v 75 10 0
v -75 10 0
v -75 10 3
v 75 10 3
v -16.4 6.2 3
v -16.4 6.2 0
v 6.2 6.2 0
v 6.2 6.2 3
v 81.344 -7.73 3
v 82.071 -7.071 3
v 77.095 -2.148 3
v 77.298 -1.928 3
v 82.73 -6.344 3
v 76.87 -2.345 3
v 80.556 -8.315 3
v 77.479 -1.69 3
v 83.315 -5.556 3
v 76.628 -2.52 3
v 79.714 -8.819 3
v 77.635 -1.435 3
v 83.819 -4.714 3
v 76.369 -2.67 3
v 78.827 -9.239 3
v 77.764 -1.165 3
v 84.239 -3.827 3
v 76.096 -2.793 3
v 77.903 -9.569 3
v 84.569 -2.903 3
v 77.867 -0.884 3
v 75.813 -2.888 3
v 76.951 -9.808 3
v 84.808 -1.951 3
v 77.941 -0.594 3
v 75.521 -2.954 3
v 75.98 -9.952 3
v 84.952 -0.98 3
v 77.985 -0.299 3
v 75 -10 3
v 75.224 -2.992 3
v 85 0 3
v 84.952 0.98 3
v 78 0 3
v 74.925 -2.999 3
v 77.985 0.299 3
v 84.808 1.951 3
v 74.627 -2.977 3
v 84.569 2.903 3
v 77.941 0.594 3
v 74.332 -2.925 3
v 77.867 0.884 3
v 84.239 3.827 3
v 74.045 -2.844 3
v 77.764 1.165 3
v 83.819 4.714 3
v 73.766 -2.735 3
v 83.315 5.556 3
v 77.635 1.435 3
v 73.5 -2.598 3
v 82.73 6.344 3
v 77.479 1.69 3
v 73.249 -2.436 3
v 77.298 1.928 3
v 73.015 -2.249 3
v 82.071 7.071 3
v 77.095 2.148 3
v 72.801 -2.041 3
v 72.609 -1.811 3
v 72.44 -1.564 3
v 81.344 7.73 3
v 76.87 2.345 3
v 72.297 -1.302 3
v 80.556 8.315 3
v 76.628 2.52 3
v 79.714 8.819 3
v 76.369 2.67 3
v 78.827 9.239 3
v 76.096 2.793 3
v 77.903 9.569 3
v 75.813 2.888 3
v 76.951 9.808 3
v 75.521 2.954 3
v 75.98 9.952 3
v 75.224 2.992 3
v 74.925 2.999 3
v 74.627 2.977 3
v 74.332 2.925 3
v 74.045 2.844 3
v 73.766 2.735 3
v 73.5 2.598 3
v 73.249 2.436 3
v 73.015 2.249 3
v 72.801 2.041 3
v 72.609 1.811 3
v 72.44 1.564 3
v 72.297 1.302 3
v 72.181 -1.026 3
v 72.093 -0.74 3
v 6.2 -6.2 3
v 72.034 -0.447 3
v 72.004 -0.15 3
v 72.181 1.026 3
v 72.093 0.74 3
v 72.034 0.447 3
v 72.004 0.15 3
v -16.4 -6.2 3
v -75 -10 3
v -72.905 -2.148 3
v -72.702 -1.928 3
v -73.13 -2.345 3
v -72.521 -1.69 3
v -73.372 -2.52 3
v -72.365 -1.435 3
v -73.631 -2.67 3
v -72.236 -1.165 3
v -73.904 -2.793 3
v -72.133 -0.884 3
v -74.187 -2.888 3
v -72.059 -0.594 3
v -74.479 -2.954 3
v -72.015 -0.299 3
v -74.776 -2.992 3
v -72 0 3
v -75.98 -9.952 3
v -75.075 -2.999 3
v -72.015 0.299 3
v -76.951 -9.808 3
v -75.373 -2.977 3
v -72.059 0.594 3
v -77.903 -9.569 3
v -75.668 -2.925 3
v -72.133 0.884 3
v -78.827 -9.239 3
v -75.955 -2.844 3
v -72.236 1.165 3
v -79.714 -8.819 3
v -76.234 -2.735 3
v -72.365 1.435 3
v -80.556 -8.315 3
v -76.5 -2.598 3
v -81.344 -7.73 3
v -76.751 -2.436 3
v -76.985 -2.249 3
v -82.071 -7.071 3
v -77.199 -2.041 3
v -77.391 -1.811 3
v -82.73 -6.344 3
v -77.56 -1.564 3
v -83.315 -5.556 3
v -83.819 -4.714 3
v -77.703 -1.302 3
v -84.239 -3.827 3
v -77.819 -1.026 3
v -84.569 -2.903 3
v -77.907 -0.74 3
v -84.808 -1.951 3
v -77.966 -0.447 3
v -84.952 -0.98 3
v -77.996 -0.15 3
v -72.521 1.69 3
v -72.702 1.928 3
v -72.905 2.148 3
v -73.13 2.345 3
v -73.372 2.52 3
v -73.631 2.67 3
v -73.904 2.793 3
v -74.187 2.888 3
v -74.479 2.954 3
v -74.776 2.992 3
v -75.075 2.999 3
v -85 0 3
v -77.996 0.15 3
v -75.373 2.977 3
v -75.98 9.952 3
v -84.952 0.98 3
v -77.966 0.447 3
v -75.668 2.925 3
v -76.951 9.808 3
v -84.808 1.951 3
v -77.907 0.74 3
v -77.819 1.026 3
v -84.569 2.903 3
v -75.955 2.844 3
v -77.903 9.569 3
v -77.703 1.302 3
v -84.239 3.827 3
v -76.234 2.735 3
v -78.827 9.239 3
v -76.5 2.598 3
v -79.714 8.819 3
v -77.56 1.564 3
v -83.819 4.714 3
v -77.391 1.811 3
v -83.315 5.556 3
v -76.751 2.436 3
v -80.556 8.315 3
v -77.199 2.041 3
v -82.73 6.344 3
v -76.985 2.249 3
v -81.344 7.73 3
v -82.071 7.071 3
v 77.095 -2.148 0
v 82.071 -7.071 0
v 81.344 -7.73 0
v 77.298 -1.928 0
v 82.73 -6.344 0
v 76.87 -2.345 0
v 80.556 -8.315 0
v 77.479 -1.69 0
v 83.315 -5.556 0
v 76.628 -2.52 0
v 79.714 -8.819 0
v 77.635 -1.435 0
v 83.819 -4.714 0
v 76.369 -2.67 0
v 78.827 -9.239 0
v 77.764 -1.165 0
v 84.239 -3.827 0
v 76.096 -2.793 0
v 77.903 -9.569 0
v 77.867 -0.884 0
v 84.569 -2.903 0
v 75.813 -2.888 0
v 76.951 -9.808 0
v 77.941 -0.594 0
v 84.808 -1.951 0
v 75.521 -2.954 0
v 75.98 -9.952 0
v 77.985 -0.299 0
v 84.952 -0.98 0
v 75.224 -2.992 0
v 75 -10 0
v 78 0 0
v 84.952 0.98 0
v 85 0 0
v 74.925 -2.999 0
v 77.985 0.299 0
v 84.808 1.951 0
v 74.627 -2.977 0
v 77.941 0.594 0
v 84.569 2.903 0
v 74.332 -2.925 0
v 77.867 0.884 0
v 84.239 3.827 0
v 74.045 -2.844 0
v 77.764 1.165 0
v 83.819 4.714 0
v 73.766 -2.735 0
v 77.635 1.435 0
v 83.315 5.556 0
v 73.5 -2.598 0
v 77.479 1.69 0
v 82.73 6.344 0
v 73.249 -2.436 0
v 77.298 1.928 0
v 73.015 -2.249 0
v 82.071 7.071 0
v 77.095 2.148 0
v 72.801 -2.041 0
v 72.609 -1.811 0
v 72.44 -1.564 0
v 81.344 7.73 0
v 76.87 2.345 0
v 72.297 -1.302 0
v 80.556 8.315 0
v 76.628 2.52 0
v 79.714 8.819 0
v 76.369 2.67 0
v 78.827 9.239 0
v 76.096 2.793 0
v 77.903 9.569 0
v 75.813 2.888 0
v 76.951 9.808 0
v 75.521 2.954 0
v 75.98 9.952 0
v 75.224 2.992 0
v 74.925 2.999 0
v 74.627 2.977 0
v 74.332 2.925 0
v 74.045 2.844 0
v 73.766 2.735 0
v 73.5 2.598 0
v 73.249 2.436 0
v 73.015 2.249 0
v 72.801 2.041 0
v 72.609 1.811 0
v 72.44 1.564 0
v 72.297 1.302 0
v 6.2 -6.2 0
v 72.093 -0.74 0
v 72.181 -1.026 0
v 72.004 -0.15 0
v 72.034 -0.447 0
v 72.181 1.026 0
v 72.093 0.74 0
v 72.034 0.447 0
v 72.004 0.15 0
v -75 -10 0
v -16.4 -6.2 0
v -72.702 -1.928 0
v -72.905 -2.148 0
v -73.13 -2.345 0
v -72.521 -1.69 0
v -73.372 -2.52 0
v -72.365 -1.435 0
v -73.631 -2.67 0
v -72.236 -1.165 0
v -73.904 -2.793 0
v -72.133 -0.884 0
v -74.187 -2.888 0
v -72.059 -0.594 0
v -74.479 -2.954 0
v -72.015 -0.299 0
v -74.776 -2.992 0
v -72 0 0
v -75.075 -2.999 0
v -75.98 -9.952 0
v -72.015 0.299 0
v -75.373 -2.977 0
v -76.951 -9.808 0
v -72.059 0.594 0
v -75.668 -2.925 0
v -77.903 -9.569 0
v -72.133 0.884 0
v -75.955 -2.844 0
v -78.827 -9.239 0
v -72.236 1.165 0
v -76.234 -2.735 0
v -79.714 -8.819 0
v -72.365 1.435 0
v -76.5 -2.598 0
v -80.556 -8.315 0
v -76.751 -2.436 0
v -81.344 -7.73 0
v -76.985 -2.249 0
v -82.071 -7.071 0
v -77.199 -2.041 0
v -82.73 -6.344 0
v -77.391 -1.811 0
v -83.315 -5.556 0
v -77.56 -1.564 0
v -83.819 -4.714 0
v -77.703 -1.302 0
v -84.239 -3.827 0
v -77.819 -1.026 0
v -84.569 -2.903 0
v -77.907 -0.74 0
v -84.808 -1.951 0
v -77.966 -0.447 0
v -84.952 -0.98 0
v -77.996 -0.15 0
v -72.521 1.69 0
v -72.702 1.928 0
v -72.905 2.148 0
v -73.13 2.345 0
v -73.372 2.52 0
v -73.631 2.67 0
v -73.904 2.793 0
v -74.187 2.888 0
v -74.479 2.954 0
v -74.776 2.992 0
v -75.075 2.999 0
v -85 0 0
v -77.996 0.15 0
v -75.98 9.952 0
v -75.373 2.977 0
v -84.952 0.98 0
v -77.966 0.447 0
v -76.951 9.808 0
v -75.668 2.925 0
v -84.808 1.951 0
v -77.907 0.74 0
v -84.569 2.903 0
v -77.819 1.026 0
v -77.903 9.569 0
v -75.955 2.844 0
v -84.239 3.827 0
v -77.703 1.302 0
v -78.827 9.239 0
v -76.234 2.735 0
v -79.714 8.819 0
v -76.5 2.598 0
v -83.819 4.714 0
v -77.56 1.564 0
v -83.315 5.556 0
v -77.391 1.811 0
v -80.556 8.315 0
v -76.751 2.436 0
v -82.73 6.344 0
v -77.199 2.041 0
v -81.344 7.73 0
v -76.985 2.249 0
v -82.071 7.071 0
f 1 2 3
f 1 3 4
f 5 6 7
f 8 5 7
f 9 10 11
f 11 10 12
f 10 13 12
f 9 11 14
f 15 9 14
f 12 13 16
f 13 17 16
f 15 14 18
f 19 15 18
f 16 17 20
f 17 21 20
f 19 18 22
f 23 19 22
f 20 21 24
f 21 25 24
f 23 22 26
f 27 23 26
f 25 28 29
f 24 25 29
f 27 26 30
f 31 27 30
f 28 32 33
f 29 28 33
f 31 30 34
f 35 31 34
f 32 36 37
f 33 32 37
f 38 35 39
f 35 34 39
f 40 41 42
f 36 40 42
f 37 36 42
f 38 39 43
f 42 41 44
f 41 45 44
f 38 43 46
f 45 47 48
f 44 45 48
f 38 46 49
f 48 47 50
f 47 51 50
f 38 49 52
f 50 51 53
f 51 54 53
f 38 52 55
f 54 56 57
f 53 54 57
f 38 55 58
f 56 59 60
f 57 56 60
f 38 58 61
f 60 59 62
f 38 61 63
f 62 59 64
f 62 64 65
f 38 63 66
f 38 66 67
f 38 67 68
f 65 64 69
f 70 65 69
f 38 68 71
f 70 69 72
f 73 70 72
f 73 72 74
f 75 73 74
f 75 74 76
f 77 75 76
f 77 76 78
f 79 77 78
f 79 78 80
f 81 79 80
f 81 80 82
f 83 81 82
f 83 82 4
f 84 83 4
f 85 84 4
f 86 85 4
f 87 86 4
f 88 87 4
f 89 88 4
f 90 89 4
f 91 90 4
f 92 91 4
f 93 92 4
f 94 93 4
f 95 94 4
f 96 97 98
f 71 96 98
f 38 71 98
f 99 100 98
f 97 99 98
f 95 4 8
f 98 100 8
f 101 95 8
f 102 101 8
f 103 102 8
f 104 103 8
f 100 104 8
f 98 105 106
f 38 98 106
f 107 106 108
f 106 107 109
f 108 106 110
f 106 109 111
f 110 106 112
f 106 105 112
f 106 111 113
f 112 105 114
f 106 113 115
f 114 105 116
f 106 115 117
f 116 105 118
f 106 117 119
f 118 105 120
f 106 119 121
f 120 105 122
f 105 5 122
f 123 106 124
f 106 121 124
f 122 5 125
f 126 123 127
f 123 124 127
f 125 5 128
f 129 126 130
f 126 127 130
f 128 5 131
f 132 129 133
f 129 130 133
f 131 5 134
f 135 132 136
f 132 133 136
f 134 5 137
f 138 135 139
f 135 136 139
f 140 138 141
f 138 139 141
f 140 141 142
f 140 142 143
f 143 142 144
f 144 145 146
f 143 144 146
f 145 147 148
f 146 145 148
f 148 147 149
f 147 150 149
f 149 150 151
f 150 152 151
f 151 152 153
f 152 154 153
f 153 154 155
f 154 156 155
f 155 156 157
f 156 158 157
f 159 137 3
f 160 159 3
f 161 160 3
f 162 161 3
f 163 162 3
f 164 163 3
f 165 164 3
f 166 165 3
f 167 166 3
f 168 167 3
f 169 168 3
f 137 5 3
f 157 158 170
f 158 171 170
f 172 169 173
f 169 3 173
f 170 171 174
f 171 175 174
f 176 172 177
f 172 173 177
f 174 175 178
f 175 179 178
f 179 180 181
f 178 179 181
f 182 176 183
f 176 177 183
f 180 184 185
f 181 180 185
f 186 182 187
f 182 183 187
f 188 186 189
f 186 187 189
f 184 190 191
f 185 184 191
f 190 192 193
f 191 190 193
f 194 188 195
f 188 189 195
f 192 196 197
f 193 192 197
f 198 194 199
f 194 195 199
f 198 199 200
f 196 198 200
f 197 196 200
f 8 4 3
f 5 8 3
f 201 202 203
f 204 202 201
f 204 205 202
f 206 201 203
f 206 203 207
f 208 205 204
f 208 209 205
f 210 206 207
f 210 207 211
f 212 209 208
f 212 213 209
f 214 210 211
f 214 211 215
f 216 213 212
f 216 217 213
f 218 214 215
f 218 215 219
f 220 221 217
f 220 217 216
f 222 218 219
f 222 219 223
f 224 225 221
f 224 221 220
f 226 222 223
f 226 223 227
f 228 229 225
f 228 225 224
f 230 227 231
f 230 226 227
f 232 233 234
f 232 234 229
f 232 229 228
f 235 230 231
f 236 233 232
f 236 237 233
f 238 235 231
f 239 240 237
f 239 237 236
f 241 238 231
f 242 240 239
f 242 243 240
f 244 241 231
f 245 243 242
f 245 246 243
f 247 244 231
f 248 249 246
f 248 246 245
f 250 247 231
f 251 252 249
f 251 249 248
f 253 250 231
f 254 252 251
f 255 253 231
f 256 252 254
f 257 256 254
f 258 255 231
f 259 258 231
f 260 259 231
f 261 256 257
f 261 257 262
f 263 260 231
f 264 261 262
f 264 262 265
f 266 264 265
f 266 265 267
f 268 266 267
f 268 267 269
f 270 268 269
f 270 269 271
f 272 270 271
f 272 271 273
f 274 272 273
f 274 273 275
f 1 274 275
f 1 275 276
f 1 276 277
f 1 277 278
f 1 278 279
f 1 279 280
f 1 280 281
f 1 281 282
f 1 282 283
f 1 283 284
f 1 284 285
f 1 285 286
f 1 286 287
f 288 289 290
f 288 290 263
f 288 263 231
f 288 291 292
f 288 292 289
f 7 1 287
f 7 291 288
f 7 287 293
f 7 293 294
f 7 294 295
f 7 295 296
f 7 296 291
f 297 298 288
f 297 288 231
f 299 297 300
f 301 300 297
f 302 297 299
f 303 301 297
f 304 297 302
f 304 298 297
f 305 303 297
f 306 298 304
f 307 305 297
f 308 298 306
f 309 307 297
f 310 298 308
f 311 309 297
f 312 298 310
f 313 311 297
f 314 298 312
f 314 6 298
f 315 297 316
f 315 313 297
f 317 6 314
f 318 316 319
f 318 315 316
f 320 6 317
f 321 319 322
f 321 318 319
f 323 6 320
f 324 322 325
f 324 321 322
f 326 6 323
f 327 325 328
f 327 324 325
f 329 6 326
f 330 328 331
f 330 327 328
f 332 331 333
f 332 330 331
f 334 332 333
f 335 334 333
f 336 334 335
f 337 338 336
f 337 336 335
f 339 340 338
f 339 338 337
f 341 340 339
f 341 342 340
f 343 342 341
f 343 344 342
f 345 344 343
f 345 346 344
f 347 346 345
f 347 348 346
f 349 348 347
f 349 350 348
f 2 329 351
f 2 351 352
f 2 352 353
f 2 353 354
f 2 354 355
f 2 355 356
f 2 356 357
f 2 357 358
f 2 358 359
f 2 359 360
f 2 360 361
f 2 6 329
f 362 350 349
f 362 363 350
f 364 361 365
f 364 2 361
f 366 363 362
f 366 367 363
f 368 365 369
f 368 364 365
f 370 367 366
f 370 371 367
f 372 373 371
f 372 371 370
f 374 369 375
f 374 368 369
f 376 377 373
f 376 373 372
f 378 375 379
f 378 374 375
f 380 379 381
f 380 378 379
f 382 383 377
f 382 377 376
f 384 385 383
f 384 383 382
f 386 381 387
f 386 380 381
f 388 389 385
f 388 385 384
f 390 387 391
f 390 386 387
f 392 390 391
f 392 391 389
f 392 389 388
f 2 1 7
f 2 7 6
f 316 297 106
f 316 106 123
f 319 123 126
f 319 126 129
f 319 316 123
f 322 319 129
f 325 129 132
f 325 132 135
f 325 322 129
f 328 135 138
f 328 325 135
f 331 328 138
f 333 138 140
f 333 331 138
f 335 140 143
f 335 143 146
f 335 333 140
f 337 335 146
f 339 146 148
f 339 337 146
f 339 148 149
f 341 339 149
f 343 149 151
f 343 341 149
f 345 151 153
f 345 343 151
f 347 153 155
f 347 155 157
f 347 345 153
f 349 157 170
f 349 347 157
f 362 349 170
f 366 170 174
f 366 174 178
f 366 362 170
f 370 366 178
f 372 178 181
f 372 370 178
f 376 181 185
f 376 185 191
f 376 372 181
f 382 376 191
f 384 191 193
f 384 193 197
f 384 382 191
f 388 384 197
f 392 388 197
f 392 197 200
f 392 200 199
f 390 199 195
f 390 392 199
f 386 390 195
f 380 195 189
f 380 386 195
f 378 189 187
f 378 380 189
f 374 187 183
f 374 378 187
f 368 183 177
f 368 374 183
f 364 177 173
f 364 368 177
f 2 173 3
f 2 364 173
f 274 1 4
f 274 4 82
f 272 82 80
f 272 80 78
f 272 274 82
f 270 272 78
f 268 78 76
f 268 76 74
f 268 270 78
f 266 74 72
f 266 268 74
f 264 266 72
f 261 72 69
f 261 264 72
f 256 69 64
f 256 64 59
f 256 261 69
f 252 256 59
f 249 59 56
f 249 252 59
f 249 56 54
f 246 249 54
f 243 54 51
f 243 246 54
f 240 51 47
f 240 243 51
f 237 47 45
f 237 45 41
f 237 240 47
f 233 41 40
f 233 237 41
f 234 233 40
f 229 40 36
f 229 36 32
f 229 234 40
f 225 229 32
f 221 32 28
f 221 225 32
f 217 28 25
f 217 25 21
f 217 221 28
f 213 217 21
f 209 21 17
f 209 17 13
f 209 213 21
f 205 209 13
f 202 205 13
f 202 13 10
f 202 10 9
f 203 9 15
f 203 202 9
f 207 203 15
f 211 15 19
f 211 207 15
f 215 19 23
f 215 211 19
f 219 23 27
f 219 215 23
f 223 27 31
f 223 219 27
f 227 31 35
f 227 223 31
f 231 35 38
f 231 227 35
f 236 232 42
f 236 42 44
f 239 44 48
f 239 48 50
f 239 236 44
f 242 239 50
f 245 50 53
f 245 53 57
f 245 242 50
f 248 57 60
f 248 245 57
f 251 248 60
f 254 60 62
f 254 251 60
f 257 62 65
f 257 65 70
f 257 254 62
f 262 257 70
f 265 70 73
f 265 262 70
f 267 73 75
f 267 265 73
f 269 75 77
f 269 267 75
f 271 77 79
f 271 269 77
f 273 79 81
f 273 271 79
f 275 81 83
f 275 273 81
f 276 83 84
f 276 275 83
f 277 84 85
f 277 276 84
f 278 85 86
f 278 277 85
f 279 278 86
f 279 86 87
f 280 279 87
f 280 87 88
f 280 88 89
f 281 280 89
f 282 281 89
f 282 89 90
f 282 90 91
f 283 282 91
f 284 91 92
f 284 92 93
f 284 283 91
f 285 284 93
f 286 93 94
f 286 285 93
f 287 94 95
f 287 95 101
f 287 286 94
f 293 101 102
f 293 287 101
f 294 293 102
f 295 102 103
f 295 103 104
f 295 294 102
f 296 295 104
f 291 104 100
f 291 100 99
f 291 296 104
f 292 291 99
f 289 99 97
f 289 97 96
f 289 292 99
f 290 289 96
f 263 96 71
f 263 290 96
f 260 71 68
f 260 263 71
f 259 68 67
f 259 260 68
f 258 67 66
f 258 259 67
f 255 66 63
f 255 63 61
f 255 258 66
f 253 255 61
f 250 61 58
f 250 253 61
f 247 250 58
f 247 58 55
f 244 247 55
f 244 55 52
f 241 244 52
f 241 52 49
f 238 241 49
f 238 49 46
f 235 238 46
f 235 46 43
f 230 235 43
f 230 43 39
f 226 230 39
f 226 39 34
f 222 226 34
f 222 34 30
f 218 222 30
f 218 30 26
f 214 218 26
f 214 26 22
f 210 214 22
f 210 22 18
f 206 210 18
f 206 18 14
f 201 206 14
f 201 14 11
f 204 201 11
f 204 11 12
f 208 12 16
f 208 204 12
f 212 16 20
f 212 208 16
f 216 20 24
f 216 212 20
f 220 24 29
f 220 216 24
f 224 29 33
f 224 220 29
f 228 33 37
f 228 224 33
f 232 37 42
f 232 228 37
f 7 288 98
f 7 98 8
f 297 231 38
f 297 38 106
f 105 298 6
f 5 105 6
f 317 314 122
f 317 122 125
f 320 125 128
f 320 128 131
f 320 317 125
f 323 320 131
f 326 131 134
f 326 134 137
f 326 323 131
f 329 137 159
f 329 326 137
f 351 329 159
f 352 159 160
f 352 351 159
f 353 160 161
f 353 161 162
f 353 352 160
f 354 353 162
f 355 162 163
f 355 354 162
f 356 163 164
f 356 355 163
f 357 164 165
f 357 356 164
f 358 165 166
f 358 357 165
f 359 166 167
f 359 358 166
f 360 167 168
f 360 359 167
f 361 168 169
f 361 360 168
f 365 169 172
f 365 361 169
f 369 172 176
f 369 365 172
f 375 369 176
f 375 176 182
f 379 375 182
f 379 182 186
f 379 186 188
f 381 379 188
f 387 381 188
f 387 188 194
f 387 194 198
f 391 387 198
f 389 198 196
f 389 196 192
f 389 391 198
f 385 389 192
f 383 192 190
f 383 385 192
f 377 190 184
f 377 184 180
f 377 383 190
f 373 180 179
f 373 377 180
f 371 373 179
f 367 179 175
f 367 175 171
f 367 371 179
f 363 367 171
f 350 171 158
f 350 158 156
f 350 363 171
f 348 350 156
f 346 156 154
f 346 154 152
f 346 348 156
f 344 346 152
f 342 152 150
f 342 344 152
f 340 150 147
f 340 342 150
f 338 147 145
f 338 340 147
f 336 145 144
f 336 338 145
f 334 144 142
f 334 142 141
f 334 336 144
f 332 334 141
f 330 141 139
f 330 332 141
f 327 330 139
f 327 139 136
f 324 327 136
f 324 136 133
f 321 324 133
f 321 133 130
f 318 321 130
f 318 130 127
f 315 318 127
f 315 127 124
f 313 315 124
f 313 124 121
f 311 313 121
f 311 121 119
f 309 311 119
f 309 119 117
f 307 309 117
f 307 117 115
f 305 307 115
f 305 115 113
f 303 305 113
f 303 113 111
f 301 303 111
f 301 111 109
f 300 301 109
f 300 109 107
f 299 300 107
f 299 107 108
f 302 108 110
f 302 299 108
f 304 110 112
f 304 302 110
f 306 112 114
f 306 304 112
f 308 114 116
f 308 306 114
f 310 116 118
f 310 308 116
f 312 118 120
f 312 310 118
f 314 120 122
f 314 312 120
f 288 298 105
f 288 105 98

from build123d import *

# Parameters (mm, degrees)
SKETCH1_R           = 3
SKETCH1_W           = 22.6
SKETCH1_H           = 12.4
BOSS_EXTRUDE1_DEPTH = 3


with BuildPart() as part:
    # Sketch1 → Boss-Extrude1 (new body)
    with BuildSketch(Plane.XY):
        with BuildLine():
            Line((75, -10), (-75, -10))
            ThreePointArc((-75, -10), (-85, 0), (-75, 10))
            Line((-75, 10), (75, 10))
            ThreePointArc((75, 10), (85, 0), (75, -10))
        make_face()
        with Locations((75, 0)):
            Circle(SKETCH1_R, mode=Mode.SUBTRACT)
        with Locations((-75, 0)):
            Circle(SKETCH1_R, mode=Mode.SUBTRACT)
        with Locations((-5.1, 0)):
            Rectangle(SKETCH1_W, SKETCH1_H, mode=Mode.SUBTRACT)
    extrude(amount=BOSS_EXTRUDE1_DEPTH)


solid = part.part
